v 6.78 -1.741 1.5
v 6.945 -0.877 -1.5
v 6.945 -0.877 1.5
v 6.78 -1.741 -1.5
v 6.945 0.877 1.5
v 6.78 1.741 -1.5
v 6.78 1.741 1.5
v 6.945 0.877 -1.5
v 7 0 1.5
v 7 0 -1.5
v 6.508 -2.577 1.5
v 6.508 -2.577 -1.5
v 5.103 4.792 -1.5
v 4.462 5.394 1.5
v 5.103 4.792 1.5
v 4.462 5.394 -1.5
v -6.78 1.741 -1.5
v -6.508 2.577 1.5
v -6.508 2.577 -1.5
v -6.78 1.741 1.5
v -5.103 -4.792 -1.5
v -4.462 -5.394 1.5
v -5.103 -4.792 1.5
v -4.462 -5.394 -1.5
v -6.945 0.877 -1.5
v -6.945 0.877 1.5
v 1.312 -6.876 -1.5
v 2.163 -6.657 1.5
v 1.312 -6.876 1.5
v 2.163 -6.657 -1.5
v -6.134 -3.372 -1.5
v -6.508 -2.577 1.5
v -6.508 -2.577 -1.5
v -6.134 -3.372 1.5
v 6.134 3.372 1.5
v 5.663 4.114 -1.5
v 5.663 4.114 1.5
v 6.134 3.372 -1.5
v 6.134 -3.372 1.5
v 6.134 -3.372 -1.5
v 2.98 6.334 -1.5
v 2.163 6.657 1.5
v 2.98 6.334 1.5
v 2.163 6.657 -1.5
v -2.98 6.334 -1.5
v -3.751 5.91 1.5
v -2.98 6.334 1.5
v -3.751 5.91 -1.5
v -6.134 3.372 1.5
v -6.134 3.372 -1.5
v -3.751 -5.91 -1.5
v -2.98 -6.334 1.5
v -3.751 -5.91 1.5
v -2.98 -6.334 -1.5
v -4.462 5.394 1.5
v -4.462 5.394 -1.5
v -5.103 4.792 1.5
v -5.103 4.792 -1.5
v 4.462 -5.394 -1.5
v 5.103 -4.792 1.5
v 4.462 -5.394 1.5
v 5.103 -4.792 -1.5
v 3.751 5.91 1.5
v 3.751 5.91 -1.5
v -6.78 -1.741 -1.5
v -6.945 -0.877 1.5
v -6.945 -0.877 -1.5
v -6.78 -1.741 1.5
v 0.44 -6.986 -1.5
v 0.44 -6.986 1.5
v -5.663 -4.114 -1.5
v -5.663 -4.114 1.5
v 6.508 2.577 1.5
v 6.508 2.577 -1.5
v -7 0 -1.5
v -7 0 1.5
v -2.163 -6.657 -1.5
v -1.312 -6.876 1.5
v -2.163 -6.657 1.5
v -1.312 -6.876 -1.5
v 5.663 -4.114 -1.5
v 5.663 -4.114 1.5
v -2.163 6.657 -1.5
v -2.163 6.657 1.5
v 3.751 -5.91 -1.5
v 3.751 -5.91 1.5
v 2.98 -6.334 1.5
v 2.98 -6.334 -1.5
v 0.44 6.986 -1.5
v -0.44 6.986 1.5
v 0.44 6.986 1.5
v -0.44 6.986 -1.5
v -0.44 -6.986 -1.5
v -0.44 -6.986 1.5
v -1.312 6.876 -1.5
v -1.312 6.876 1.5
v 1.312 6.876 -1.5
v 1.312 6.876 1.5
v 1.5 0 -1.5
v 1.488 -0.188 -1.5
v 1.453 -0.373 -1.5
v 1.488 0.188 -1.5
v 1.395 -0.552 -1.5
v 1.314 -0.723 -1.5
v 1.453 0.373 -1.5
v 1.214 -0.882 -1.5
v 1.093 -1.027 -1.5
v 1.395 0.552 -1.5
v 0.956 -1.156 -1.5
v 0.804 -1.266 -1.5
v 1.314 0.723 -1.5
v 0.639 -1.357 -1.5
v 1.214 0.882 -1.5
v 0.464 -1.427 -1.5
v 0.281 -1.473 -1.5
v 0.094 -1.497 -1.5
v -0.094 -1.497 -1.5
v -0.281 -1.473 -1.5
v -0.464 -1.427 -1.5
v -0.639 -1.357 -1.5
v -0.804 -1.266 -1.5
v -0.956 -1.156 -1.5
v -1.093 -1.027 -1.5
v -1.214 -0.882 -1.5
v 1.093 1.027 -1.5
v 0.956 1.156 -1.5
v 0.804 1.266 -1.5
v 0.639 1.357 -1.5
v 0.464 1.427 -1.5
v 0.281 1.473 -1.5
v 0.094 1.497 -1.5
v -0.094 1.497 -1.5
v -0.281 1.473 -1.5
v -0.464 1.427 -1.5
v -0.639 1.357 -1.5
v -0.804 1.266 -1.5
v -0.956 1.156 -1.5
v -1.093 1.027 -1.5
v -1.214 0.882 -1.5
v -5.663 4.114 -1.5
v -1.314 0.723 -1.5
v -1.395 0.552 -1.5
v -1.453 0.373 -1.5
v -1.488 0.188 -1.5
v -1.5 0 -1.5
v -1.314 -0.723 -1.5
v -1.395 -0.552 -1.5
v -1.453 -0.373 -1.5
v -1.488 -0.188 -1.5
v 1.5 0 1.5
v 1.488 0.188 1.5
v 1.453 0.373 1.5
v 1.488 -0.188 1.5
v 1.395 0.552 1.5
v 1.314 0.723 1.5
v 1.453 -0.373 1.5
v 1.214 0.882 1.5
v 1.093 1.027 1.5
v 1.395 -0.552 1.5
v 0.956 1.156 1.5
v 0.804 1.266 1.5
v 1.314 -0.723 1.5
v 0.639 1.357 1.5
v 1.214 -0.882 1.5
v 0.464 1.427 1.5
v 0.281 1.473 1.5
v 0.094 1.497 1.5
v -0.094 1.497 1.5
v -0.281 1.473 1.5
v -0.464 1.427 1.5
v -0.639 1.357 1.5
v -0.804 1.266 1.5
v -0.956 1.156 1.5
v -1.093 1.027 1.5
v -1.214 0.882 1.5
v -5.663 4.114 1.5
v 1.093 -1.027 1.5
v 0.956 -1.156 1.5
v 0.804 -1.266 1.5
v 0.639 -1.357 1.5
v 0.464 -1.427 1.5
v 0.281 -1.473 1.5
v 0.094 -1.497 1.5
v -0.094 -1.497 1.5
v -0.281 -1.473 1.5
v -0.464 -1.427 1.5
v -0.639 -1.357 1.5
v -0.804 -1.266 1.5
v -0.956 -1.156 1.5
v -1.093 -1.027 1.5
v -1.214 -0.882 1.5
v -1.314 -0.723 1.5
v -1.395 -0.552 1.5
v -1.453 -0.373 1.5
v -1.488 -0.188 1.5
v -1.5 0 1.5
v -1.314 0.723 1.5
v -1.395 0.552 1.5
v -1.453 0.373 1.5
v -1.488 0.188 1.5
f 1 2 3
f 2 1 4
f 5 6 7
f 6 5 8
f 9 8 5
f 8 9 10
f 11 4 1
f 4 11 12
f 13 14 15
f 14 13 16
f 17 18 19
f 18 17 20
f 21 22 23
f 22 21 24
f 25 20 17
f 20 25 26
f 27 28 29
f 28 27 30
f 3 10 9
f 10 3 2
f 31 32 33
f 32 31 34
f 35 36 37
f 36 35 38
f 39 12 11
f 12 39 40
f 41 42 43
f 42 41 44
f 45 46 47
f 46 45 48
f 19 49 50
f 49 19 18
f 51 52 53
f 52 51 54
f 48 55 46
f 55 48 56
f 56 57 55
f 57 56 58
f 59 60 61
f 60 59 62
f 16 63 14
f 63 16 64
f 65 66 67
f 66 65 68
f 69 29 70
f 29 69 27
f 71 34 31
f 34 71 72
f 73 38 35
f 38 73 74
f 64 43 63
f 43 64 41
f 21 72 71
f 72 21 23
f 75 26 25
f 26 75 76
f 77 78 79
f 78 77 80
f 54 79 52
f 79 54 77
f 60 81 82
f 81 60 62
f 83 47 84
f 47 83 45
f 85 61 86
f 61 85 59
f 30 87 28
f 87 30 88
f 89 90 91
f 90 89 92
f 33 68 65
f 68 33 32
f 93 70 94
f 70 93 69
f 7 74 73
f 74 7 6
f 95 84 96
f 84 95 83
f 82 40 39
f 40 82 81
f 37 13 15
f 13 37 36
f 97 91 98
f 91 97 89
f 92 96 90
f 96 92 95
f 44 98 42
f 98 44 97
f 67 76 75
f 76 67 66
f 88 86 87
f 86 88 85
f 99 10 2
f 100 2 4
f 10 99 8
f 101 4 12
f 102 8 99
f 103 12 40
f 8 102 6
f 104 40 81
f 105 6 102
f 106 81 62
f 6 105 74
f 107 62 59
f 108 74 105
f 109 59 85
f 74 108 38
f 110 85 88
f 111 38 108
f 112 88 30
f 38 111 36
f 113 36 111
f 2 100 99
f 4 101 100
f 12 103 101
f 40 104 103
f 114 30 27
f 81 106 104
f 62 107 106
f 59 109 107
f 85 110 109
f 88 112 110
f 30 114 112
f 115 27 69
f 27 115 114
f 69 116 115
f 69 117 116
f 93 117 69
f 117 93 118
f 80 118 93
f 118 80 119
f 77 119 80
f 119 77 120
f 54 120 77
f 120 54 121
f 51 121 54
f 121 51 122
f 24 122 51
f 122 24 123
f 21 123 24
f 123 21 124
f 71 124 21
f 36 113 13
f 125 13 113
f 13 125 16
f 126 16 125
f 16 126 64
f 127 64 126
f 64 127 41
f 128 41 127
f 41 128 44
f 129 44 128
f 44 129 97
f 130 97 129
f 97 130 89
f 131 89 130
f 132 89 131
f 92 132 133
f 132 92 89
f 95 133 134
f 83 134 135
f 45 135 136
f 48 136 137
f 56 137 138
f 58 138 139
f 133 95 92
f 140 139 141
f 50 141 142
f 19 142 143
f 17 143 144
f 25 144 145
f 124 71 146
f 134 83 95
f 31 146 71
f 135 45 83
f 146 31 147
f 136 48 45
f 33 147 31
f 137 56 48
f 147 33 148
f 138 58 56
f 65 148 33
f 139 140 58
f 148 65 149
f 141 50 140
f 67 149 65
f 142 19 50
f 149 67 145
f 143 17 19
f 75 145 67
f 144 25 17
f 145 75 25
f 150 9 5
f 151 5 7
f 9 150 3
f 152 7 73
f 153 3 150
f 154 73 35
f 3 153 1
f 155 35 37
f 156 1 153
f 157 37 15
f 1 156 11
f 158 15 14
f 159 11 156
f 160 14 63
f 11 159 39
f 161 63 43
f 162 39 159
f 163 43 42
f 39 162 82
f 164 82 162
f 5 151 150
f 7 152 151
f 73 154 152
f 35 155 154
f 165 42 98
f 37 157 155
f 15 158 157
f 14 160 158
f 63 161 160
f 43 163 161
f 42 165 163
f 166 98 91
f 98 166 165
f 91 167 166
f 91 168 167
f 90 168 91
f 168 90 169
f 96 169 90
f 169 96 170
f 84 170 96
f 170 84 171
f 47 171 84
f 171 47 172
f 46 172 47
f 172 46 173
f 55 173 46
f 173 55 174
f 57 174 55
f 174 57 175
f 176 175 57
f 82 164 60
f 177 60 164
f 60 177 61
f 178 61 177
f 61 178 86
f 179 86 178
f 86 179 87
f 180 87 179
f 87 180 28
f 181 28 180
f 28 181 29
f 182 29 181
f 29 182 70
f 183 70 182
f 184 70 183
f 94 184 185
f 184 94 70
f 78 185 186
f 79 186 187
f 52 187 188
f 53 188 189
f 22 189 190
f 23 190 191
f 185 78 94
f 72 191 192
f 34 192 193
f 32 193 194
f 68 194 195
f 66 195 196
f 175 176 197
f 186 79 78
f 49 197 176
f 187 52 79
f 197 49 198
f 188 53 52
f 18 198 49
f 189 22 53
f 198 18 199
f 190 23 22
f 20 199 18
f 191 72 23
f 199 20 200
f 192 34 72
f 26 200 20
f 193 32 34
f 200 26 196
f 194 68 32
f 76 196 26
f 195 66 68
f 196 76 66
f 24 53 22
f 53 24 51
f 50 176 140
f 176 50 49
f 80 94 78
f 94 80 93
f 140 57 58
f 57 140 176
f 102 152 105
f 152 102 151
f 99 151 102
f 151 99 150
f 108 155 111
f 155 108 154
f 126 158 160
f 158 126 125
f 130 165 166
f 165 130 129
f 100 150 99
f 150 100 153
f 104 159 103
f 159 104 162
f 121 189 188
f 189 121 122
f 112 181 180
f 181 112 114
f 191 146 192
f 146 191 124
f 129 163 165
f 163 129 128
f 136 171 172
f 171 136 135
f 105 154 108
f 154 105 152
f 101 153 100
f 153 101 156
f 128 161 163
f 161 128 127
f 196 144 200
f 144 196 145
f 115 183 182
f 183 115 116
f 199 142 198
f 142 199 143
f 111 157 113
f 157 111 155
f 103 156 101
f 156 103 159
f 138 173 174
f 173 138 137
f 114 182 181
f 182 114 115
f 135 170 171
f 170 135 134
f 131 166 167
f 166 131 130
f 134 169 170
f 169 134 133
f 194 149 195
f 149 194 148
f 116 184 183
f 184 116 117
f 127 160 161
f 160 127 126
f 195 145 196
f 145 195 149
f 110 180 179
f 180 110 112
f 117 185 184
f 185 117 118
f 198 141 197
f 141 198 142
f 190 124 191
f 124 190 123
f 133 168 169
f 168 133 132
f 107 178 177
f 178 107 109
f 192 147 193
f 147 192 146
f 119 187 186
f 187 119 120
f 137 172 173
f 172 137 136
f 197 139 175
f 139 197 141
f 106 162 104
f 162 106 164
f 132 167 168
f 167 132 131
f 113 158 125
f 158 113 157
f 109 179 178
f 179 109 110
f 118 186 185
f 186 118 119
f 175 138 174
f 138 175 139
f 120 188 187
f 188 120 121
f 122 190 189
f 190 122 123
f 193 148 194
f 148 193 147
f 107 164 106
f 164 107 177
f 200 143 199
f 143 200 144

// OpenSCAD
$fn = 50;


difference() {
	union() {
		translate(v = [0, 0, -1.5000000000]) {
			cylinder(h = 3, r = 7.0000000000);
		}
		translate(v = [0, 0, -1.5000000000]) {
			cylinder(h = 3, r = 3.0000000000);
		}
	}
	union() {
		translate(v = [0, 0, -50.0000000000]) {
			cylinder(h = 100, r = 1.5000000000);
		}
	}
}
